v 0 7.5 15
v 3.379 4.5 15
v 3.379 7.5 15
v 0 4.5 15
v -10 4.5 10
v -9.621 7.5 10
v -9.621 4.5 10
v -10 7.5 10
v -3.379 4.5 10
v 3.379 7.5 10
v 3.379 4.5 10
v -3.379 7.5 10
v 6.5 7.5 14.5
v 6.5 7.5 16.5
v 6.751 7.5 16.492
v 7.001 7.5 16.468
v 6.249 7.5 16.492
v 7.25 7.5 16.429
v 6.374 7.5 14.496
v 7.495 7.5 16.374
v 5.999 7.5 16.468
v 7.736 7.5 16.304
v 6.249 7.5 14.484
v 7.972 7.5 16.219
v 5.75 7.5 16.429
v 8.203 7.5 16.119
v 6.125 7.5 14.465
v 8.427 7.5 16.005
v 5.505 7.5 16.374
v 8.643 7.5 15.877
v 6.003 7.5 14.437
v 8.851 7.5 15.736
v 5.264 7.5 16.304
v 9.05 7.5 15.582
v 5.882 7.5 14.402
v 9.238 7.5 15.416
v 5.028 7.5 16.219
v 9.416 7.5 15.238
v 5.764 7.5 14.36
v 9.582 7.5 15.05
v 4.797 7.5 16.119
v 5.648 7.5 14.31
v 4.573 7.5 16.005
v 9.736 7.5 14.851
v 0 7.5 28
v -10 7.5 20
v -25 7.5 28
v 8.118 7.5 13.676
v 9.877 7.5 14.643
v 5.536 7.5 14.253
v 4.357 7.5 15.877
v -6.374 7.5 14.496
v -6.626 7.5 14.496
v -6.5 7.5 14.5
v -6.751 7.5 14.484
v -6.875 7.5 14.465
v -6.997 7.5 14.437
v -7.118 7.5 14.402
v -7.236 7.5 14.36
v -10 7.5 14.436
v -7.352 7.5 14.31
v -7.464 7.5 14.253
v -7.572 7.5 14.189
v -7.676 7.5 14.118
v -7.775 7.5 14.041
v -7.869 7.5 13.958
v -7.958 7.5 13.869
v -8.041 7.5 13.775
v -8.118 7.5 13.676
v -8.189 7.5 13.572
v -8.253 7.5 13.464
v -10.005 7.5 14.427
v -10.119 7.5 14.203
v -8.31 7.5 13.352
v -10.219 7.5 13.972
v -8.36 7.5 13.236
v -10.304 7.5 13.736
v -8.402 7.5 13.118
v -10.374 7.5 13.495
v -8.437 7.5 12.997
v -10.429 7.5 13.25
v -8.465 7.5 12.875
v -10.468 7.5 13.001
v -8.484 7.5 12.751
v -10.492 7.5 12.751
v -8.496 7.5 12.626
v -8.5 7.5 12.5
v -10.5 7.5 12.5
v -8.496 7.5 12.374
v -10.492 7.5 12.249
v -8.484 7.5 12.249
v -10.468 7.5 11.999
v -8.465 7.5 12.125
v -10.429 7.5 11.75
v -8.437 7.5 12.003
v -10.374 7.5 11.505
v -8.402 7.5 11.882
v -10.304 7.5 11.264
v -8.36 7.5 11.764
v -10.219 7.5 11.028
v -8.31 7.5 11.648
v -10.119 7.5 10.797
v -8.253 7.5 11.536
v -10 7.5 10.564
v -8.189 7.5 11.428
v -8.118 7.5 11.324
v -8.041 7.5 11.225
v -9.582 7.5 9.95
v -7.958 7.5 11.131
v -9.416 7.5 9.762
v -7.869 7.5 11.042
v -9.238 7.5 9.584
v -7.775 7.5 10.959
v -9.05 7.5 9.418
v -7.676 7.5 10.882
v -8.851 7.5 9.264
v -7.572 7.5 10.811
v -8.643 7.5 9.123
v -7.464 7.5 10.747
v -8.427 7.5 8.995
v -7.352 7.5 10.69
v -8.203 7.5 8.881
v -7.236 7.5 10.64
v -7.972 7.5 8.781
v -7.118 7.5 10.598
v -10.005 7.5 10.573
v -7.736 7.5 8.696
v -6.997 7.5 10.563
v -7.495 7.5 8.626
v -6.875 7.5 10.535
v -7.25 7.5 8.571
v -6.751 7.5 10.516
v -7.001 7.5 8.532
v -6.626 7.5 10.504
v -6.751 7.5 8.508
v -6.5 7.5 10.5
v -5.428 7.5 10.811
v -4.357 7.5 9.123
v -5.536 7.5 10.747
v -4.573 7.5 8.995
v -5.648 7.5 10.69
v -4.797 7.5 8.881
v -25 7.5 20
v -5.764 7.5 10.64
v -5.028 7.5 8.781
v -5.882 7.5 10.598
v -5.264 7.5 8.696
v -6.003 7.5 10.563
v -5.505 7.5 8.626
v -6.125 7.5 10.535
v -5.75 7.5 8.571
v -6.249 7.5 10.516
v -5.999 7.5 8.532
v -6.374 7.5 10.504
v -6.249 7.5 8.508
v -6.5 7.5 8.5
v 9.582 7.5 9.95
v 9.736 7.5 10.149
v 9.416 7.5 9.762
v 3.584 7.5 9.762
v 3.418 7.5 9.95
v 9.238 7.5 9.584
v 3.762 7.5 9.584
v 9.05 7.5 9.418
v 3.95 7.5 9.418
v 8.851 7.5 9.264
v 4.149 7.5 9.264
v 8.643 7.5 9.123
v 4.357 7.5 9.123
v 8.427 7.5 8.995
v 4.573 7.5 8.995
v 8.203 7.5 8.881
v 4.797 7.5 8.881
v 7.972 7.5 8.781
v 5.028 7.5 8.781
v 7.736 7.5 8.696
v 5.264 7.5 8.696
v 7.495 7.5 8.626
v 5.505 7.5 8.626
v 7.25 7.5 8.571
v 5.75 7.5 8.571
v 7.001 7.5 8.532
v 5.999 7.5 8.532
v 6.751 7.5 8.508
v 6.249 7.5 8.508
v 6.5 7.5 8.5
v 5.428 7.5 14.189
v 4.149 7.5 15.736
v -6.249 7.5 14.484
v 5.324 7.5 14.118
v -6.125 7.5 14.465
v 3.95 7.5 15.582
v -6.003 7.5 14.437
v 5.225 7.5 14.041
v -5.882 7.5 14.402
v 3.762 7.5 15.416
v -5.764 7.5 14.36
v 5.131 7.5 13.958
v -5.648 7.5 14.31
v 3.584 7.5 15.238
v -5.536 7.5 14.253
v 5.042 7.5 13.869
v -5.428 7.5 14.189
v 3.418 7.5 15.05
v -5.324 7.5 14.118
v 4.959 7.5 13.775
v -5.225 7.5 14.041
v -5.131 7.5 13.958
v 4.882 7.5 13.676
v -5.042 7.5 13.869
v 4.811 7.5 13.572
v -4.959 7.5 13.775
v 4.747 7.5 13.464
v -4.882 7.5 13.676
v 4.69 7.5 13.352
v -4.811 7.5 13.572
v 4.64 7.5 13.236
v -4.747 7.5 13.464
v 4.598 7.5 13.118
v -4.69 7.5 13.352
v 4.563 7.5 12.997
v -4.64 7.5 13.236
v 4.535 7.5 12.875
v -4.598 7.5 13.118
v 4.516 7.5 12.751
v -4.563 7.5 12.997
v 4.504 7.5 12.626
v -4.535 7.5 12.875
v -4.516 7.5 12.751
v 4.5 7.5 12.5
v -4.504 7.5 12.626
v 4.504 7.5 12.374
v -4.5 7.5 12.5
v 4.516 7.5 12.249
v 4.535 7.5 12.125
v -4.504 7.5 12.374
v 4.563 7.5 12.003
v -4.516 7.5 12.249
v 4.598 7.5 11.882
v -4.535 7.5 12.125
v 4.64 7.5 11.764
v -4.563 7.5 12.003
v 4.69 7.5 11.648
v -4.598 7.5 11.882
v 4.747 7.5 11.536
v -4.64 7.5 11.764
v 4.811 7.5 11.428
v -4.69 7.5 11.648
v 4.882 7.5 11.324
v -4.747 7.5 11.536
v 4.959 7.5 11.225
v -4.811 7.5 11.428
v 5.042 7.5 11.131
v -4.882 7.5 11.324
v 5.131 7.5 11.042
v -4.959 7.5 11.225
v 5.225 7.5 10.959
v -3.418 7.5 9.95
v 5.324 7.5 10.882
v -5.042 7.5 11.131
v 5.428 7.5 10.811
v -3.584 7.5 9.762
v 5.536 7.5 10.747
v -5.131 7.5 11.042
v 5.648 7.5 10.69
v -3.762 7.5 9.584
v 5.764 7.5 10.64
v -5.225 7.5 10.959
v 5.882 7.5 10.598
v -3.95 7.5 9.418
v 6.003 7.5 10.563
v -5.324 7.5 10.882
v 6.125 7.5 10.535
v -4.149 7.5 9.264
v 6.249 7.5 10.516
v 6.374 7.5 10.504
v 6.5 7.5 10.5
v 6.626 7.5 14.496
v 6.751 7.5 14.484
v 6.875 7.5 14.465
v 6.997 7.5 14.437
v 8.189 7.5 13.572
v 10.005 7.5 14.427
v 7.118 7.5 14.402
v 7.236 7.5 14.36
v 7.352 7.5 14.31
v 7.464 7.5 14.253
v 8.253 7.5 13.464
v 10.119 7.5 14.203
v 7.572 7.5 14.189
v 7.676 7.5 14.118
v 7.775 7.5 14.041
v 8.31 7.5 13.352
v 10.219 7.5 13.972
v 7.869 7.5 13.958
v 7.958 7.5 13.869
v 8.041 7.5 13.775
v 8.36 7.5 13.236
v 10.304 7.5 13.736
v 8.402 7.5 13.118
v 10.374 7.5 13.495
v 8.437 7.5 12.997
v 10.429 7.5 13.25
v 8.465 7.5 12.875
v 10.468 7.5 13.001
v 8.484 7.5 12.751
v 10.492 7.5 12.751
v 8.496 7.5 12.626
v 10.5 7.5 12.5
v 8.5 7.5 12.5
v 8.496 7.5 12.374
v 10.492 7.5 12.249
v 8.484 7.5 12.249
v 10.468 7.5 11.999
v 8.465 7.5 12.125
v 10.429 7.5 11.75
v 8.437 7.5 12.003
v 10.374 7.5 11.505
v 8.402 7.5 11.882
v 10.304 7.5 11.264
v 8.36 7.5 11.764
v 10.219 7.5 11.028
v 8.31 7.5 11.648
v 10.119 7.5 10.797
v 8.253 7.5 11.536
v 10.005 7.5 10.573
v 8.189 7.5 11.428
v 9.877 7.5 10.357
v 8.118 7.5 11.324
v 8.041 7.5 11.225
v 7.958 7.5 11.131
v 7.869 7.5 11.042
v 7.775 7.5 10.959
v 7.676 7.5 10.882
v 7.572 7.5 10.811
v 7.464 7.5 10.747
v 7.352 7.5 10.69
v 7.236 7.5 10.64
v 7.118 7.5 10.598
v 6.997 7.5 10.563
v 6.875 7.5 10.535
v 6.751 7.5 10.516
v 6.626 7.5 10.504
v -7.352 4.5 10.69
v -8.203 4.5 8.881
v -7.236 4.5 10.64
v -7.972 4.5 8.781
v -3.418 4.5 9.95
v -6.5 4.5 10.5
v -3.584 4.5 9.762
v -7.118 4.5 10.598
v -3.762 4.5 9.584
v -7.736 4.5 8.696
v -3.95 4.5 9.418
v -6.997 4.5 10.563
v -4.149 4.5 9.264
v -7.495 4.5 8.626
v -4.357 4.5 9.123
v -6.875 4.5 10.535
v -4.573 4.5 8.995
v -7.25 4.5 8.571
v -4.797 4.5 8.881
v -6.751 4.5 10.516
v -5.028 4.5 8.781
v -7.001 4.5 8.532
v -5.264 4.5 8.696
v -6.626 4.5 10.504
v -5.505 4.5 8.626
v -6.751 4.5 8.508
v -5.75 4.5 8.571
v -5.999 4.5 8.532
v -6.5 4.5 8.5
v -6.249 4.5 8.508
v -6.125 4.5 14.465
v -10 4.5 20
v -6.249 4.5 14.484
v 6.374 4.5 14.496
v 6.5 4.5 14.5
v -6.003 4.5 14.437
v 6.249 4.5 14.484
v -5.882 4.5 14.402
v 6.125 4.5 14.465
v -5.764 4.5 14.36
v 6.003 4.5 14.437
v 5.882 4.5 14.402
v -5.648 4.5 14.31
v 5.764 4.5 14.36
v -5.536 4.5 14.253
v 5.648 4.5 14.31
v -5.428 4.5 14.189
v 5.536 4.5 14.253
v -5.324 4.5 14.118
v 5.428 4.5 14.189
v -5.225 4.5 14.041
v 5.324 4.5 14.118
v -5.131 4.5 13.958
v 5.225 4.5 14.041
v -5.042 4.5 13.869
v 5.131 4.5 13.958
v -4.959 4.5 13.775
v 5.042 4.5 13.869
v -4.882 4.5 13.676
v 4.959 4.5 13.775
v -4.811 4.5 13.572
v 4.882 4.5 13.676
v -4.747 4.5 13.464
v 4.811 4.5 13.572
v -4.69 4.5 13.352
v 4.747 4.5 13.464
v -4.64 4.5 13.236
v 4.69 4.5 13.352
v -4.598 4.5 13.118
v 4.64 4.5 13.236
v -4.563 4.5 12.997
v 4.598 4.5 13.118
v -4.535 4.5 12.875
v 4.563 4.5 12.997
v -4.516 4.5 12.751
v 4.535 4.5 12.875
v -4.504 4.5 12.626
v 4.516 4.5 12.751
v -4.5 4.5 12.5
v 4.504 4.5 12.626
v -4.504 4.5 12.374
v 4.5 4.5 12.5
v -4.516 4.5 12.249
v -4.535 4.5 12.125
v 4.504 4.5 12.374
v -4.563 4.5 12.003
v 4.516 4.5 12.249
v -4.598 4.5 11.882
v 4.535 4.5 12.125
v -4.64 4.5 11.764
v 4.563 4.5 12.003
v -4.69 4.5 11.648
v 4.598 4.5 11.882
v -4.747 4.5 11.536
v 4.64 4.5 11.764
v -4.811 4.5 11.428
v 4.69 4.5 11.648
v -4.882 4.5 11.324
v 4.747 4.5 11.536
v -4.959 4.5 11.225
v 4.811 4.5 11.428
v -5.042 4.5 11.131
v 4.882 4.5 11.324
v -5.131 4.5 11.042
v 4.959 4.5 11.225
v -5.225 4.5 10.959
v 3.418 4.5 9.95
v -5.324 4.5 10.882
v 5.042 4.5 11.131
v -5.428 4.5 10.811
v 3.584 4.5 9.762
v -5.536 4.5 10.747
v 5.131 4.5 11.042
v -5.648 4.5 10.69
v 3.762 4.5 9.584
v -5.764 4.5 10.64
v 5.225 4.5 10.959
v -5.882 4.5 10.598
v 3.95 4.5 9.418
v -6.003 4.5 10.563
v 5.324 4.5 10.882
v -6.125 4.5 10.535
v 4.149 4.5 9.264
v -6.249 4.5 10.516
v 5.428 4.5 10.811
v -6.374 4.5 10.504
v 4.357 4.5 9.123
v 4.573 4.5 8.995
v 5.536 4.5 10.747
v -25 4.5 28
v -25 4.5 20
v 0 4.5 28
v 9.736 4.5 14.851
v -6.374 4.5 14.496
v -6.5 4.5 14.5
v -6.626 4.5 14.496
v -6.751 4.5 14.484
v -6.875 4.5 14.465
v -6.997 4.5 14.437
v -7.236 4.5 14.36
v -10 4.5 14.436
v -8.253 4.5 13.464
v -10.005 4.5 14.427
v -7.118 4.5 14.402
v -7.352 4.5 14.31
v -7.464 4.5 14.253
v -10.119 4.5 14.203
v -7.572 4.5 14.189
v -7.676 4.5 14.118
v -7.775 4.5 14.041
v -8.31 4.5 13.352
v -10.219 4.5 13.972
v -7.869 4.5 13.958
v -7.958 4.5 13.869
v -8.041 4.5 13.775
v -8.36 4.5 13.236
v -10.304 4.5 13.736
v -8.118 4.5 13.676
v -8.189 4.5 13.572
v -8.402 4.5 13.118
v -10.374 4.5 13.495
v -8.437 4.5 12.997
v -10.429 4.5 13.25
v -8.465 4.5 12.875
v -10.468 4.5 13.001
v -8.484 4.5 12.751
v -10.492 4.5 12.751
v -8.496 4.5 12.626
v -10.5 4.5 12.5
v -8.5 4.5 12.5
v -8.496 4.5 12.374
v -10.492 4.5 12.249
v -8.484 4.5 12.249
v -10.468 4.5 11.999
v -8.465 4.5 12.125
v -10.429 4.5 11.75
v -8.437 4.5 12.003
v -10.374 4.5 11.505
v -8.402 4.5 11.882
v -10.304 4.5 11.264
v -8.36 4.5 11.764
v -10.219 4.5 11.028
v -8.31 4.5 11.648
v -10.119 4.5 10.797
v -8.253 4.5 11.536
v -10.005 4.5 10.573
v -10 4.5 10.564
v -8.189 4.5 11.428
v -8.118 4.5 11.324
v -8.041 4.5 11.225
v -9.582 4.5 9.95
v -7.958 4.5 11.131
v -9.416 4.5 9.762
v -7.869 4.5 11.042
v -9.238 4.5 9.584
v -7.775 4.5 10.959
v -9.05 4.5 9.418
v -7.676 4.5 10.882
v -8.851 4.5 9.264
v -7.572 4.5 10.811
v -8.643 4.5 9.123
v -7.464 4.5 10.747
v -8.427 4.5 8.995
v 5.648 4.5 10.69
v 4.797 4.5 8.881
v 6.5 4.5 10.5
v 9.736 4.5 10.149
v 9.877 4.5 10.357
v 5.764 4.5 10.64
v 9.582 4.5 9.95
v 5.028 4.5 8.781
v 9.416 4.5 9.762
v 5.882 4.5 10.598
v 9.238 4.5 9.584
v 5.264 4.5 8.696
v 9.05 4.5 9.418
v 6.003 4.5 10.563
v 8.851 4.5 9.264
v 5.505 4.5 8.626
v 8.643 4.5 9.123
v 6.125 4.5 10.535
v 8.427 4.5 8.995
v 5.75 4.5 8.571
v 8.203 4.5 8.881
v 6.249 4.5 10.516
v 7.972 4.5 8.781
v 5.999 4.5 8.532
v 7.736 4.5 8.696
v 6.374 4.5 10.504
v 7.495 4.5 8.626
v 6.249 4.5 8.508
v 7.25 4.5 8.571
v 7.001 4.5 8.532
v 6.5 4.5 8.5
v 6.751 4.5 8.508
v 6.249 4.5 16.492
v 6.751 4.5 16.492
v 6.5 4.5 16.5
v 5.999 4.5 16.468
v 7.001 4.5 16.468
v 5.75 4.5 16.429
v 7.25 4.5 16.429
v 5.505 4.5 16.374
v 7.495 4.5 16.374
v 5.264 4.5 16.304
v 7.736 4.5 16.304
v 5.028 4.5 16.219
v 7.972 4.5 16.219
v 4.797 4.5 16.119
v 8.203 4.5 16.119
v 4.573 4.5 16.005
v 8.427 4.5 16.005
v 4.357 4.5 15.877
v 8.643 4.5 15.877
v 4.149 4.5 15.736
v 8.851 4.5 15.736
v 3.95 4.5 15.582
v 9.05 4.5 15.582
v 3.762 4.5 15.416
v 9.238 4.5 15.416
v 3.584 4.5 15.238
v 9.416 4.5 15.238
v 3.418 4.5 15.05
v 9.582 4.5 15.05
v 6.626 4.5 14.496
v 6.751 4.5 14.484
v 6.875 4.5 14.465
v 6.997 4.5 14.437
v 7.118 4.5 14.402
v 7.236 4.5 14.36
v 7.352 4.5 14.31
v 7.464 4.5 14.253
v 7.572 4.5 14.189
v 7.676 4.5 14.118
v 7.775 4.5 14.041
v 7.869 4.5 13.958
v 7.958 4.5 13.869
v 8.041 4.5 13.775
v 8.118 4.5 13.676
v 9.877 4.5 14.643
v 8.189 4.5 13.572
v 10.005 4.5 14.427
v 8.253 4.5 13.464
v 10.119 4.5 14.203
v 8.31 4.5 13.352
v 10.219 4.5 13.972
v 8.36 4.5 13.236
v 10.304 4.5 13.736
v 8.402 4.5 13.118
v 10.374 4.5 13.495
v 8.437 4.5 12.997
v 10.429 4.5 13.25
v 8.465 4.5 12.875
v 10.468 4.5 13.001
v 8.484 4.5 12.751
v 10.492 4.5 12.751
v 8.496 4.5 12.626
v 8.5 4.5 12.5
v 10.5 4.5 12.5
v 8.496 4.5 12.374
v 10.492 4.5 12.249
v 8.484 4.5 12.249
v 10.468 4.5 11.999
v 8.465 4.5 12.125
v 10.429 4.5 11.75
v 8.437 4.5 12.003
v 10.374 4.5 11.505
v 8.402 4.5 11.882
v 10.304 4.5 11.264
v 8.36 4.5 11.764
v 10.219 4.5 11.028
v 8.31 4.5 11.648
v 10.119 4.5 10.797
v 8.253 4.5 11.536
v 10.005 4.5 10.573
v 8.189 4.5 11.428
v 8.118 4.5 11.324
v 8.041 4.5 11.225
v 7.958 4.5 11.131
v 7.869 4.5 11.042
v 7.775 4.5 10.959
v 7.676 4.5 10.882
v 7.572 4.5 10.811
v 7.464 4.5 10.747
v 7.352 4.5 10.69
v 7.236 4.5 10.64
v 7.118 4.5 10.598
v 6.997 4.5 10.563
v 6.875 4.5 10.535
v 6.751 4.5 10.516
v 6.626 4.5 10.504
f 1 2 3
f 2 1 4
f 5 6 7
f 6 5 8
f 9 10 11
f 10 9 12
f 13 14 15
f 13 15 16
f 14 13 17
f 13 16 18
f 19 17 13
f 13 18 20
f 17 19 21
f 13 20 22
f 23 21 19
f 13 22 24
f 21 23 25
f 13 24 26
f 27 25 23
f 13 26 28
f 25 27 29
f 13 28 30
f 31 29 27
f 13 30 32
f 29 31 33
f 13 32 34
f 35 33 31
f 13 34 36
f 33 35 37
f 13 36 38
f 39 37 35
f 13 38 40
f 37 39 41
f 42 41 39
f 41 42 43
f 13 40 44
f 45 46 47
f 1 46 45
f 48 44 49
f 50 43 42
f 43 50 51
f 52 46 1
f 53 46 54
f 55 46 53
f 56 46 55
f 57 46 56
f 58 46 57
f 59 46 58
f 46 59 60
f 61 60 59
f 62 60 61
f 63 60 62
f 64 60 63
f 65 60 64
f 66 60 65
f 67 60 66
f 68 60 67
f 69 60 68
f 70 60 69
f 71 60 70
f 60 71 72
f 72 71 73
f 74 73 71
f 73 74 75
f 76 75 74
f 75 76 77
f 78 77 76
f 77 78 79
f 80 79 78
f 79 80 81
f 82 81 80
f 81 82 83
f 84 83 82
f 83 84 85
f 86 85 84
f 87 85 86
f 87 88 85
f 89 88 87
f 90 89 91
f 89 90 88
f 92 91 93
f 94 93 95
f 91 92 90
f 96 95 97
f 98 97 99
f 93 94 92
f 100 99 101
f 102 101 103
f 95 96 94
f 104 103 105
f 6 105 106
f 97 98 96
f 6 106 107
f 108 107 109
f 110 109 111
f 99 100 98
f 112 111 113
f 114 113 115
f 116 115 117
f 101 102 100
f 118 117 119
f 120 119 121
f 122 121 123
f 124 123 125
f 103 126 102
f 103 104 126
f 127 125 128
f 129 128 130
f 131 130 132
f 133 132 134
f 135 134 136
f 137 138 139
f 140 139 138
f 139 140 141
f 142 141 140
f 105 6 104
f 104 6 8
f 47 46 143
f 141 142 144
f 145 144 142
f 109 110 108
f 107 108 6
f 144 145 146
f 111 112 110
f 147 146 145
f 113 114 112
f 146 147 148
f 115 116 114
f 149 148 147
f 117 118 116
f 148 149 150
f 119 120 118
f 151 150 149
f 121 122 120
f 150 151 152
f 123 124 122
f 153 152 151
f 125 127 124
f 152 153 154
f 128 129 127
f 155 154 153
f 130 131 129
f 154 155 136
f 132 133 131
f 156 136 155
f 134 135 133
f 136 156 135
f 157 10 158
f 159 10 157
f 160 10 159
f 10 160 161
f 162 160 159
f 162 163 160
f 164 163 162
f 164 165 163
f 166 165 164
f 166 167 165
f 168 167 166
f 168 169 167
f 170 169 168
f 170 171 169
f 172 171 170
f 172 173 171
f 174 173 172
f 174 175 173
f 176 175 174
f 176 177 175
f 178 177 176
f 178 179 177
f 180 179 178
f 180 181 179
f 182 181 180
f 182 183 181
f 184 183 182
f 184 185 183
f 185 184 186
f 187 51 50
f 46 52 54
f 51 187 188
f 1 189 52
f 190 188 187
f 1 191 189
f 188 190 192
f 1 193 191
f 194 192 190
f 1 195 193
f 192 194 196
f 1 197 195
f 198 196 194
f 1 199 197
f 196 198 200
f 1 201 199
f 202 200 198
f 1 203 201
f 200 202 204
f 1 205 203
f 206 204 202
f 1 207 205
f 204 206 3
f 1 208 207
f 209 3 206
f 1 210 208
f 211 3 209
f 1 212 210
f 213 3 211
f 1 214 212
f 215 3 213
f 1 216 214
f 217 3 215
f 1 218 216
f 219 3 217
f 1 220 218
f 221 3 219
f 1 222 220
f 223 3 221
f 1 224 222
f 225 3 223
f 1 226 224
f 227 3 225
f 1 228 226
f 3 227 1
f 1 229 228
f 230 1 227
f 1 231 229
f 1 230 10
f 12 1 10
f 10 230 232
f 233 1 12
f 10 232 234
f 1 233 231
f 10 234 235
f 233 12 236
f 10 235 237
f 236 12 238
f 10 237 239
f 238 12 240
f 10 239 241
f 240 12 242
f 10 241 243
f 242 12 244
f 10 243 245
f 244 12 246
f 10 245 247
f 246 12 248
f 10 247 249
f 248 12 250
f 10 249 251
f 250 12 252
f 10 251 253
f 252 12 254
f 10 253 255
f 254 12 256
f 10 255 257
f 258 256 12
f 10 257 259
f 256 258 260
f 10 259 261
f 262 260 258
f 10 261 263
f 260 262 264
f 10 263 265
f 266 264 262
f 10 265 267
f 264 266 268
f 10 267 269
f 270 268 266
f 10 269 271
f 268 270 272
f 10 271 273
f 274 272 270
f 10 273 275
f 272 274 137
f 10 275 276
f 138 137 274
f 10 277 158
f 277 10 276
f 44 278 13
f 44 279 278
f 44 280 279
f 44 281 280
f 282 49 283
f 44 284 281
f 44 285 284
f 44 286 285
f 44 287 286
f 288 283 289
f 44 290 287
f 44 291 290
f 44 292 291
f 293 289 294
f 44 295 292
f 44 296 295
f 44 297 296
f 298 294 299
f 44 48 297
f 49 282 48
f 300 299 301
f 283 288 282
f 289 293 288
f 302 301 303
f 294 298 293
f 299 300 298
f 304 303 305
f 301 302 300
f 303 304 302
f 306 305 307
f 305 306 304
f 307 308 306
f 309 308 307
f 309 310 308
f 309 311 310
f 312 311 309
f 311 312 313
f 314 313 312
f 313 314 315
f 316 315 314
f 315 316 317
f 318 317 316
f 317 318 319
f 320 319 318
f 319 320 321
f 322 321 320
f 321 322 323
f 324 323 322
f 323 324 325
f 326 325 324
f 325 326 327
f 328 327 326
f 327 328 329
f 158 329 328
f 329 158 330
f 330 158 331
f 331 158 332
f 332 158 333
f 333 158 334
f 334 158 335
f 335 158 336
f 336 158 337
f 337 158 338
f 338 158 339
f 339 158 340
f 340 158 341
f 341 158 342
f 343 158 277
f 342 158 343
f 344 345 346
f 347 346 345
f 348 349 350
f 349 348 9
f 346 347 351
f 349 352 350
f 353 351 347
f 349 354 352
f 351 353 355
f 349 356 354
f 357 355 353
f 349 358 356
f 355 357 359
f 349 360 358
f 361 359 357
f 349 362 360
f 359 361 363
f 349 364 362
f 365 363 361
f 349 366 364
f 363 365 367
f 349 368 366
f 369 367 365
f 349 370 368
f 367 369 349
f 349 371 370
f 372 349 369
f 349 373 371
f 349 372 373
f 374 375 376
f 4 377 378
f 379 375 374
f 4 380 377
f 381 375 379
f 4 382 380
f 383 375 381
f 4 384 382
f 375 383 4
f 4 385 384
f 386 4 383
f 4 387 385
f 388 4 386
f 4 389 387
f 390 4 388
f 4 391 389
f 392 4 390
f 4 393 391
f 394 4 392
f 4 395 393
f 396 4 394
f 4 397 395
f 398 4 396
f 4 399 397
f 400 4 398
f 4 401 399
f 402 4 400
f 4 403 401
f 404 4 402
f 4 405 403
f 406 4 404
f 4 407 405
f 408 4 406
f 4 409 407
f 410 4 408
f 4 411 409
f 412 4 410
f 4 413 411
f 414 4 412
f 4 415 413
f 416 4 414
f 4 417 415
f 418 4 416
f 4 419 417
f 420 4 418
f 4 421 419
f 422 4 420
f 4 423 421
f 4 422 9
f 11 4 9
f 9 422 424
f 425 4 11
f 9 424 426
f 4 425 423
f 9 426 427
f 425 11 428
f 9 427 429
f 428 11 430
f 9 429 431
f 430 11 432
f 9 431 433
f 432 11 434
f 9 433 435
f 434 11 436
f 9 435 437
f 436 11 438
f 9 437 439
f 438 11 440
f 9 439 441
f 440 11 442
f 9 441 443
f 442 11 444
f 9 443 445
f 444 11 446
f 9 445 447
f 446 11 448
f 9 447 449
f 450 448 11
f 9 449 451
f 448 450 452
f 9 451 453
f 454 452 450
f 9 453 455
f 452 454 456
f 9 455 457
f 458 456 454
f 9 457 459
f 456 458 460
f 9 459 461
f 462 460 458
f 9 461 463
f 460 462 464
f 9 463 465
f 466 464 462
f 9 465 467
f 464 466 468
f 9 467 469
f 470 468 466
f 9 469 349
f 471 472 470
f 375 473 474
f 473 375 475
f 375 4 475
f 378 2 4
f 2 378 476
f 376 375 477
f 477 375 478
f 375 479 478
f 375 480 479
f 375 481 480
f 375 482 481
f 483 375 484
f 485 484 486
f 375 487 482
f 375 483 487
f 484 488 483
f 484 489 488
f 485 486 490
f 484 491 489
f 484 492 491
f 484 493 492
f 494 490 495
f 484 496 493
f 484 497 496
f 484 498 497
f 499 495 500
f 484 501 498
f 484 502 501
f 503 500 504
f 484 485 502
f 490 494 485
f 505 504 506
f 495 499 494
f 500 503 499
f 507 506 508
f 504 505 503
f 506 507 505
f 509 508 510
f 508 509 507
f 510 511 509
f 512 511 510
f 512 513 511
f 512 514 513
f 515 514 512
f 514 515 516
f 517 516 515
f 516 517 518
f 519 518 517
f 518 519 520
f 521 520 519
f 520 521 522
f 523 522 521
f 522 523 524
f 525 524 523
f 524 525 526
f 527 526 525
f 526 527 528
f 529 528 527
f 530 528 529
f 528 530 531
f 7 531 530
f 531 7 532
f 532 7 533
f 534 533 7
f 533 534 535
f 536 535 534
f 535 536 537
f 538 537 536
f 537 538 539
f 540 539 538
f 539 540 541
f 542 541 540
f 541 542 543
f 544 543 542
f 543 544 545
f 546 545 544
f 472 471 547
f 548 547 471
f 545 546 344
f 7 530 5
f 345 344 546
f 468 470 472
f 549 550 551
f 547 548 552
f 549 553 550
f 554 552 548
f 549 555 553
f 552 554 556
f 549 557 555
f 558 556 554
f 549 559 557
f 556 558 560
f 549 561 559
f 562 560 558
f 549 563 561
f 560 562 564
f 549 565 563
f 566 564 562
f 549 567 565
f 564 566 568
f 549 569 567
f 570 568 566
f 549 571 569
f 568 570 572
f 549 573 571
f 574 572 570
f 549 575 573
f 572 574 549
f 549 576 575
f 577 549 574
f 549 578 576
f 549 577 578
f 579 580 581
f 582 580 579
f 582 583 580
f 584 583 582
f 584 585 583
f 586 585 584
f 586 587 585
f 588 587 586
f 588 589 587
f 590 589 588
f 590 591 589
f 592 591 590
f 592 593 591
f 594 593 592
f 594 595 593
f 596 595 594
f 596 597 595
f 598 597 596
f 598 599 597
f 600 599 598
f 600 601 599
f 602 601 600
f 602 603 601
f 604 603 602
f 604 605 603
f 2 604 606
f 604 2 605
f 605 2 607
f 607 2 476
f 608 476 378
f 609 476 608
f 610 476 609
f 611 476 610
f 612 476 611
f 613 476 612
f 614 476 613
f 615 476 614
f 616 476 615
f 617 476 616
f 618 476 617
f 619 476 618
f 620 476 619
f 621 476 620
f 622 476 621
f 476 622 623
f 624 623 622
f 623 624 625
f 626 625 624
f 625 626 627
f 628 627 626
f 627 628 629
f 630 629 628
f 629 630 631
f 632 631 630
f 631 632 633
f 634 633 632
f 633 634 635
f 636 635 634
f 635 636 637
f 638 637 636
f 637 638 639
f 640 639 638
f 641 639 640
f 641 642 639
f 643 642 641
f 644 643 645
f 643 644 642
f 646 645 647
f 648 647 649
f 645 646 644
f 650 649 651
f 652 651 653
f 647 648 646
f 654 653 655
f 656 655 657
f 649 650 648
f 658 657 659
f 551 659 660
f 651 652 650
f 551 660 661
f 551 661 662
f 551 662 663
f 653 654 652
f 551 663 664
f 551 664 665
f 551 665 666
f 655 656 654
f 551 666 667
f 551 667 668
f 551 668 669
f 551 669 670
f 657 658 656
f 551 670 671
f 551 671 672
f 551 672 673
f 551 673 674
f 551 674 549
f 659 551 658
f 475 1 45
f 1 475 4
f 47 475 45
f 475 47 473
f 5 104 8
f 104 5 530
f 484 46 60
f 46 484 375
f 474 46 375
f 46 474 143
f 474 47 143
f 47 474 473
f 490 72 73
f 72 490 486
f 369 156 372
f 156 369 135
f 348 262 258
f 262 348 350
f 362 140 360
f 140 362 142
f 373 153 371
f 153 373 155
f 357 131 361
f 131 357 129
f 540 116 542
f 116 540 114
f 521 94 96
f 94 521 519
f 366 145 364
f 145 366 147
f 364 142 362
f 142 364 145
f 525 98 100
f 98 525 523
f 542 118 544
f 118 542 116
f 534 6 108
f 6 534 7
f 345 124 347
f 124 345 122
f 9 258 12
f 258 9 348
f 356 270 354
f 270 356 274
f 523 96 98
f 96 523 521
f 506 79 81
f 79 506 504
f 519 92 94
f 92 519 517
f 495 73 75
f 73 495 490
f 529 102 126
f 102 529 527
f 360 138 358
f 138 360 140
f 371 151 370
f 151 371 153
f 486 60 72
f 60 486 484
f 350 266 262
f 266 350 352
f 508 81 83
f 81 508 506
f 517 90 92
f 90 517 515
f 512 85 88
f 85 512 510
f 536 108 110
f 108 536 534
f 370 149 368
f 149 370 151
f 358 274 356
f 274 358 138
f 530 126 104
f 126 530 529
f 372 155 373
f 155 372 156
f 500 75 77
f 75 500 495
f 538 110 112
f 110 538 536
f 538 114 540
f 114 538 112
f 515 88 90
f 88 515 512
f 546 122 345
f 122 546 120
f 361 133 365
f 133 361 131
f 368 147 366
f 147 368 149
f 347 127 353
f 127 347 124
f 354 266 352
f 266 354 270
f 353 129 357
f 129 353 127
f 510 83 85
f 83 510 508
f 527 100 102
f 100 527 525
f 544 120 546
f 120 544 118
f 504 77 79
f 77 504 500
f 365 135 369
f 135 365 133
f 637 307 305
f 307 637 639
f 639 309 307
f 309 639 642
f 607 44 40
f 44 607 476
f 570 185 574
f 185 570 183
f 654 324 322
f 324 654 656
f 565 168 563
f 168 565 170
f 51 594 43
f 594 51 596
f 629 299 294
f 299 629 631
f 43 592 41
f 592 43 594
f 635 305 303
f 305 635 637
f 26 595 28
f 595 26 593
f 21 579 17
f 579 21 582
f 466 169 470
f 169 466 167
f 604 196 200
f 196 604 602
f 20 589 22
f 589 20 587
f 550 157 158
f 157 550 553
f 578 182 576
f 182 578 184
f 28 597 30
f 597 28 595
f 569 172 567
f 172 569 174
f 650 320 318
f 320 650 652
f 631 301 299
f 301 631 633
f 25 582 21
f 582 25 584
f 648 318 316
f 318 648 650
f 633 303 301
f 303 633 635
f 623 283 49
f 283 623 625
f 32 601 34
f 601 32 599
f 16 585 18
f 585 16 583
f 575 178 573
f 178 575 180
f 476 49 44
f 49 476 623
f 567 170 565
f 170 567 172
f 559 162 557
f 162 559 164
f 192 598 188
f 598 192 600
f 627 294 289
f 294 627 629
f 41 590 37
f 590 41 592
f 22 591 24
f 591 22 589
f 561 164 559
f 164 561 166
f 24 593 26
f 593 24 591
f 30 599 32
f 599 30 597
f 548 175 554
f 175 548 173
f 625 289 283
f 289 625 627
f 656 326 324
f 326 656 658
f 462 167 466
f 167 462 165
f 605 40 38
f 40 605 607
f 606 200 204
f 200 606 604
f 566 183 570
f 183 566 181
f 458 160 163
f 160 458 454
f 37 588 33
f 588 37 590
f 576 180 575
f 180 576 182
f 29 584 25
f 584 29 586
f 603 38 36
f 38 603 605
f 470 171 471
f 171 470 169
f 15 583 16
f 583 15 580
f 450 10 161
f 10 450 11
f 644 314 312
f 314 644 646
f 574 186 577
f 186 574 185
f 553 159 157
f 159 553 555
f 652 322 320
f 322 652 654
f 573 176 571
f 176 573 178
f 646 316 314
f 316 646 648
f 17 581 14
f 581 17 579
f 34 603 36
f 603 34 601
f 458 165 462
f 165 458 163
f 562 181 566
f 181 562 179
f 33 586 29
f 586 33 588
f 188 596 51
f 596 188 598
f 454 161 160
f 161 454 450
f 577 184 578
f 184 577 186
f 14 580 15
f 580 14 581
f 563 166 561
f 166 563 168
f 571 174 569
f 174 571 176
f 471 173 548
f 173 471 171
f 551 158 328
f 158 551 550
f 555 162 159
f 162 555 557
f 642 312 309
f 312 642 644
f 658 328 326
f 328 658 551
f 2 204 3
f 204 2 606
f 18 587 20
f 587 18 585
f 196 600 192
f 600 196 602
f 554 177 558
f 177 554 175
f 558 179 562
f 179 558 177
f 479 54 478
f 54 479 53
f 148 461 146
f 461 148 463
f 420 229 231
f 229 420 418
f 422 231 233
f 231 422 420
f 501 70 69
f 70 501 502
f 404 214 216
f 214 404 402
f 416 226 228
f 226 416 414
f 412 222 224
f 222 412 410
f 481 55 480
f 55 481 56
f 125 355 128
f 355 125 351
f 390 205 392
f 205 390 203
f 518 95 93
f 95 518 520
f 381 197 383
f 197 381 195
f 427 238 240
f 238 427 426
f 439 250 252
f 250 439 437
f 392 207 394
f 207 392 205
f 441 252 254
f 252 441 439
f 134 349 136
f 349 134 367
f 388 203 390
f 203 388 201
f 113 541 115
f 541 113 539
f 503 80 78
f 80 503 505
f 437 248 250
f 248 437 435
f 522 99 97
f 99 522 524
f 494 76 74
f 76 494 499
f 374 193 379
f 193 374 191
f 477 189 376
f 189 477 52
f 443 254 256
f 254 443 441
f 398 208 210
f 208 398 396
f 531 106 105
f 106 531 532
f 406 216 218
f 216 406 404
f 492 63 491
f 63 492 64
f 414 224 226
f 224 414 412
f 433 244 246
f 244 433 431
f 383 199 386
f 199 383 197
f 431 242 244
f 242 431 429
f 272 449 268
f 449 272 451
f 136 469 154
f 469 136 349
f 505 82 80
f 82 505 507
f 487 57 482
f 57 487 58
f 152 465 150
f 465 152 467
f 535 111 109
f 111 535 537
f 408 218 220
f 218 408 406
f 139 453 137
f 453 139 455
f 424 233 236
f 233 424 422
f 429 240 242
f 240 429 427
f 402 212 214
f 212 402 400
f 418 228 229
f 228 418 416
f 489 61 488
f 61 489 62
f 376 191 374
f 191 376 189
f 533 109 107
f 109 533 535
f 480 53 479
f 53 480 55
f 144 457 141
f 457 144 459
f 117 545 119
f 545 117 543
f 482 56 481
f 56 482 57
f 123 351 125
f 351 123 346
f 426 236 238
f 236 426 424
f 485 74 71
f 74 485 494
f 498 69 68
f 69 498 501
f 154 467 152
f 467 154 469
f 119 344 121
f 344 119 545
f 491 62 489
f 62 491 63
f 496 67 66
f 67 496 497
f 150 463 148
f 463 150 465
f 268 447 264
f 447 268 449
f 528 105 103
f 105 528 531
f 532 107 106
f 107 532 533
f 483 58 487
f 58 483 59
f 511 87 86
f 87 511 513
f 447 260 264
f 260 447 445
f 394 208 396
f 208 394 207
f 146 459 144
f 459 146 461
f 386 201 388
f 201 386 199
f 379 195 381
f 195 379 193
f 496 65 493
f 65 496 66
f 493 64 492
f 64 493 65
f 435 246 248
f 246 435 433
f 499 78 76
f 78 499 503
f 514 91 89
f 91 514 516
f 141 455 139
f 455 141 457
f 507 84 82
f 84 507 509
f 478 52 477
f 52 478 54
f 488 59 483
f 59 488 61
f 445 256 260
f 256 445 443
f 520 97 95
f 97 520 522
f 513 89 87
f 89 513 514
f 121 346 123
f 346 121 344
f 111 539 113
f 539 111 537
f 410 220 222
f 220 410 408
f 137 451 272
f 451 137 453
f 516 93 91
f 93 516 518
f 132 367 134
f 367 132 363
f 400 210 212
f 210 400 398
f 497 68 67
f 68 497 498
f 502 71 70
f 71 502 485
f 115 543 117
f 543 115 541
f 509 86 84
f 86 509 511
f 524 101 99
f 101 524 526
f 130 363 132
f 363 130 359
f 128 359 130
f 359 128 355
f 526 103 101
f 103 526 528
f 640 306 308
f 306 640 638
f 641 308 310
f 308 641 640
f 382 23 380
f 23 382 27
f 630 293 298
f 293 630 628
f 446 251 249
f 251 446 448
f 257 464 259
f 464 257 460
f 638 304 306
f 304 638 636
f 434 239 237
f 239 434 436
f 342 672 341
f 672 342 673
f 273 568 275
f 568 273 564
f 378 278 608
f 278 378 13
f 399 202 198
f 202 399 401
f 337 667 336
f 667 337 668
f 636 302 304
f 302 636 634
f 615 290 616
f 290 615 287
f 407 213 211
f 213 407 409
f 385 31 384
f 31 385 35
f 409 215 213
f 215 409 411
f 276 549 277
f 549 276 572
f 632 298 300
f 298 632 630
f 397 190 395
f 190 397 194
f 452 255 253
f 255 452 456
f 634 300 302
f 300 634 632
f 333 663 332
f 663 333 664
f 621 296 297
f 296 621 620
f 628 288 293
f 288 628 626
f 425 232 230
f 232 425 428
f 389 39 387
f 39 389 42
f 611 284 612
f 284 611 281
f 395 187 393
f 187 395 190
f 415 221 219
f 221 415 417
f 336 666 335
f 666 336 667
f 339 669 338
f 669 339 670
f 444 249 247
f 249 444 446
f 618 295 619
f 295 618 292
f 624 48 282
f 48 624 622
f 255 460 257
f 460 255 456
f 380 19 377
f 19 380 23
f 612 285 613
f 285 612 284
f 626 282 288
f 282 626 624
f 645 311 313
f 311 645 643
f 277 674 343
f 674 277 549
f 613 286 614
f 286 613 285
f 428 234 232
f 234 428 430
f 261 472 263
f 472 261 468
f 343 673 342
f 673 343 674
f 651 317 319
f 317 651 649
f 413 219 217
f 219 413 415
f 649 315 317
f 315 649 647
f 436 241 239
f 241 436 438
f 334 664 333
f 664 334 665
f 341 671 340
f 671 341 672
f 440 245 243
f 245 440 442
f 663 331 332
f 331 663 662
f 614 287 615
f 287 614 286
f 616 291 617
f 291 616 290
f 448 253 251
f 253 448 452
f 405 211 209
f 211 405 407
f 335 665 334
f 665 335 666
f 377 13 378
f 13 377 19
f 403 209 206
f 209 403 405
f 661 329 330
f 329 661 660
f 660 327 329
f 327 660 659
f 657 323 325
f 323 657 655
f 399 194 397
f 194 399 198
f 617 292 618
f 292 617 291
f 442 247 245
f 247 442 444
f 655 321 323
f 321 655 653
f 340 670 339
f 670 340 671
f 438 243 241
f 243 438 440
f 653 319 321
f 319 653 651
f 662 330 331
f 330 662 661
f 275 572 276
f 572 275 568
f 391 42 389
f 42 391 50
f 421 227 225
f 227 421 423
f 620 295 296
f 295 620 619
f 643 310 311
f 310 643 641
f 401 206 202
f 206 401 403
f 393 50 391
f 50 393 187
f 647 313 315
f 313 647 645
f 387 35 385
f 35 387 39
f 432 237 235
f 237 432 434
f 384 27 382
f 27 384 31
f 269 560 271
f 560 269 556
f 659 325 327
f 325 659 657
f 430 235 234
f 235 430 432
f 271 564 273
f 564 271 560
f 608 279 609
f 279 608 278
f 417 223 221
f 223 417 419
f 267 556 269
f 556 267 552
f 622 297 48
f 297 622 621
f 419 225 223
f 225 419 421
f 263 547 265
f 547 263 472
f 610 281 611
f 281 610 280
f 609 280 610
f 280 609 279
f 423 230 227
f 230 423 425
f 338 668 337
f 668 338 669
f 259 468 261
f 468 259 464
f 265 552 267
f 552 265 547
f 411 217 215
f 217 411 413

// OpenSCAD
difference(){
	union(){
        
        translate([-8,4.5,10]){
            cube([15,3,5], center=false);
        }         
        translate([-10,4.5,10]){
            cube([10,3,18], center=false);
        }         
        translate([-25,4.5,0+20]){
            cube([15,3,8], center=false);
        }  

        
        
        


        translate([-6.5,7.5,12.5]){
            rotate([90,0,0]){
                cylinder(h=3, r=4, $fn=100, center=false);
            }
        }         
        translate([6.5,7.5,12.5]){
            rotate([90,0,0]){
                cylinder(h=3, r=4, $fn=100, center=false);
            }
        }         


	}
	union() {
        translate([-6.5,8.5,12.5]){
            rotate([90,0,0]){
                cylinder(h=25, r=2, $fn=100, center=false);
            }
        }         
        translate([6.5,8.5,12.5]){
            rotate([90,0,0]){
                cylinder(h=25, r=2, $fn=100, center=false);
            }
        }             


   

	}
}
